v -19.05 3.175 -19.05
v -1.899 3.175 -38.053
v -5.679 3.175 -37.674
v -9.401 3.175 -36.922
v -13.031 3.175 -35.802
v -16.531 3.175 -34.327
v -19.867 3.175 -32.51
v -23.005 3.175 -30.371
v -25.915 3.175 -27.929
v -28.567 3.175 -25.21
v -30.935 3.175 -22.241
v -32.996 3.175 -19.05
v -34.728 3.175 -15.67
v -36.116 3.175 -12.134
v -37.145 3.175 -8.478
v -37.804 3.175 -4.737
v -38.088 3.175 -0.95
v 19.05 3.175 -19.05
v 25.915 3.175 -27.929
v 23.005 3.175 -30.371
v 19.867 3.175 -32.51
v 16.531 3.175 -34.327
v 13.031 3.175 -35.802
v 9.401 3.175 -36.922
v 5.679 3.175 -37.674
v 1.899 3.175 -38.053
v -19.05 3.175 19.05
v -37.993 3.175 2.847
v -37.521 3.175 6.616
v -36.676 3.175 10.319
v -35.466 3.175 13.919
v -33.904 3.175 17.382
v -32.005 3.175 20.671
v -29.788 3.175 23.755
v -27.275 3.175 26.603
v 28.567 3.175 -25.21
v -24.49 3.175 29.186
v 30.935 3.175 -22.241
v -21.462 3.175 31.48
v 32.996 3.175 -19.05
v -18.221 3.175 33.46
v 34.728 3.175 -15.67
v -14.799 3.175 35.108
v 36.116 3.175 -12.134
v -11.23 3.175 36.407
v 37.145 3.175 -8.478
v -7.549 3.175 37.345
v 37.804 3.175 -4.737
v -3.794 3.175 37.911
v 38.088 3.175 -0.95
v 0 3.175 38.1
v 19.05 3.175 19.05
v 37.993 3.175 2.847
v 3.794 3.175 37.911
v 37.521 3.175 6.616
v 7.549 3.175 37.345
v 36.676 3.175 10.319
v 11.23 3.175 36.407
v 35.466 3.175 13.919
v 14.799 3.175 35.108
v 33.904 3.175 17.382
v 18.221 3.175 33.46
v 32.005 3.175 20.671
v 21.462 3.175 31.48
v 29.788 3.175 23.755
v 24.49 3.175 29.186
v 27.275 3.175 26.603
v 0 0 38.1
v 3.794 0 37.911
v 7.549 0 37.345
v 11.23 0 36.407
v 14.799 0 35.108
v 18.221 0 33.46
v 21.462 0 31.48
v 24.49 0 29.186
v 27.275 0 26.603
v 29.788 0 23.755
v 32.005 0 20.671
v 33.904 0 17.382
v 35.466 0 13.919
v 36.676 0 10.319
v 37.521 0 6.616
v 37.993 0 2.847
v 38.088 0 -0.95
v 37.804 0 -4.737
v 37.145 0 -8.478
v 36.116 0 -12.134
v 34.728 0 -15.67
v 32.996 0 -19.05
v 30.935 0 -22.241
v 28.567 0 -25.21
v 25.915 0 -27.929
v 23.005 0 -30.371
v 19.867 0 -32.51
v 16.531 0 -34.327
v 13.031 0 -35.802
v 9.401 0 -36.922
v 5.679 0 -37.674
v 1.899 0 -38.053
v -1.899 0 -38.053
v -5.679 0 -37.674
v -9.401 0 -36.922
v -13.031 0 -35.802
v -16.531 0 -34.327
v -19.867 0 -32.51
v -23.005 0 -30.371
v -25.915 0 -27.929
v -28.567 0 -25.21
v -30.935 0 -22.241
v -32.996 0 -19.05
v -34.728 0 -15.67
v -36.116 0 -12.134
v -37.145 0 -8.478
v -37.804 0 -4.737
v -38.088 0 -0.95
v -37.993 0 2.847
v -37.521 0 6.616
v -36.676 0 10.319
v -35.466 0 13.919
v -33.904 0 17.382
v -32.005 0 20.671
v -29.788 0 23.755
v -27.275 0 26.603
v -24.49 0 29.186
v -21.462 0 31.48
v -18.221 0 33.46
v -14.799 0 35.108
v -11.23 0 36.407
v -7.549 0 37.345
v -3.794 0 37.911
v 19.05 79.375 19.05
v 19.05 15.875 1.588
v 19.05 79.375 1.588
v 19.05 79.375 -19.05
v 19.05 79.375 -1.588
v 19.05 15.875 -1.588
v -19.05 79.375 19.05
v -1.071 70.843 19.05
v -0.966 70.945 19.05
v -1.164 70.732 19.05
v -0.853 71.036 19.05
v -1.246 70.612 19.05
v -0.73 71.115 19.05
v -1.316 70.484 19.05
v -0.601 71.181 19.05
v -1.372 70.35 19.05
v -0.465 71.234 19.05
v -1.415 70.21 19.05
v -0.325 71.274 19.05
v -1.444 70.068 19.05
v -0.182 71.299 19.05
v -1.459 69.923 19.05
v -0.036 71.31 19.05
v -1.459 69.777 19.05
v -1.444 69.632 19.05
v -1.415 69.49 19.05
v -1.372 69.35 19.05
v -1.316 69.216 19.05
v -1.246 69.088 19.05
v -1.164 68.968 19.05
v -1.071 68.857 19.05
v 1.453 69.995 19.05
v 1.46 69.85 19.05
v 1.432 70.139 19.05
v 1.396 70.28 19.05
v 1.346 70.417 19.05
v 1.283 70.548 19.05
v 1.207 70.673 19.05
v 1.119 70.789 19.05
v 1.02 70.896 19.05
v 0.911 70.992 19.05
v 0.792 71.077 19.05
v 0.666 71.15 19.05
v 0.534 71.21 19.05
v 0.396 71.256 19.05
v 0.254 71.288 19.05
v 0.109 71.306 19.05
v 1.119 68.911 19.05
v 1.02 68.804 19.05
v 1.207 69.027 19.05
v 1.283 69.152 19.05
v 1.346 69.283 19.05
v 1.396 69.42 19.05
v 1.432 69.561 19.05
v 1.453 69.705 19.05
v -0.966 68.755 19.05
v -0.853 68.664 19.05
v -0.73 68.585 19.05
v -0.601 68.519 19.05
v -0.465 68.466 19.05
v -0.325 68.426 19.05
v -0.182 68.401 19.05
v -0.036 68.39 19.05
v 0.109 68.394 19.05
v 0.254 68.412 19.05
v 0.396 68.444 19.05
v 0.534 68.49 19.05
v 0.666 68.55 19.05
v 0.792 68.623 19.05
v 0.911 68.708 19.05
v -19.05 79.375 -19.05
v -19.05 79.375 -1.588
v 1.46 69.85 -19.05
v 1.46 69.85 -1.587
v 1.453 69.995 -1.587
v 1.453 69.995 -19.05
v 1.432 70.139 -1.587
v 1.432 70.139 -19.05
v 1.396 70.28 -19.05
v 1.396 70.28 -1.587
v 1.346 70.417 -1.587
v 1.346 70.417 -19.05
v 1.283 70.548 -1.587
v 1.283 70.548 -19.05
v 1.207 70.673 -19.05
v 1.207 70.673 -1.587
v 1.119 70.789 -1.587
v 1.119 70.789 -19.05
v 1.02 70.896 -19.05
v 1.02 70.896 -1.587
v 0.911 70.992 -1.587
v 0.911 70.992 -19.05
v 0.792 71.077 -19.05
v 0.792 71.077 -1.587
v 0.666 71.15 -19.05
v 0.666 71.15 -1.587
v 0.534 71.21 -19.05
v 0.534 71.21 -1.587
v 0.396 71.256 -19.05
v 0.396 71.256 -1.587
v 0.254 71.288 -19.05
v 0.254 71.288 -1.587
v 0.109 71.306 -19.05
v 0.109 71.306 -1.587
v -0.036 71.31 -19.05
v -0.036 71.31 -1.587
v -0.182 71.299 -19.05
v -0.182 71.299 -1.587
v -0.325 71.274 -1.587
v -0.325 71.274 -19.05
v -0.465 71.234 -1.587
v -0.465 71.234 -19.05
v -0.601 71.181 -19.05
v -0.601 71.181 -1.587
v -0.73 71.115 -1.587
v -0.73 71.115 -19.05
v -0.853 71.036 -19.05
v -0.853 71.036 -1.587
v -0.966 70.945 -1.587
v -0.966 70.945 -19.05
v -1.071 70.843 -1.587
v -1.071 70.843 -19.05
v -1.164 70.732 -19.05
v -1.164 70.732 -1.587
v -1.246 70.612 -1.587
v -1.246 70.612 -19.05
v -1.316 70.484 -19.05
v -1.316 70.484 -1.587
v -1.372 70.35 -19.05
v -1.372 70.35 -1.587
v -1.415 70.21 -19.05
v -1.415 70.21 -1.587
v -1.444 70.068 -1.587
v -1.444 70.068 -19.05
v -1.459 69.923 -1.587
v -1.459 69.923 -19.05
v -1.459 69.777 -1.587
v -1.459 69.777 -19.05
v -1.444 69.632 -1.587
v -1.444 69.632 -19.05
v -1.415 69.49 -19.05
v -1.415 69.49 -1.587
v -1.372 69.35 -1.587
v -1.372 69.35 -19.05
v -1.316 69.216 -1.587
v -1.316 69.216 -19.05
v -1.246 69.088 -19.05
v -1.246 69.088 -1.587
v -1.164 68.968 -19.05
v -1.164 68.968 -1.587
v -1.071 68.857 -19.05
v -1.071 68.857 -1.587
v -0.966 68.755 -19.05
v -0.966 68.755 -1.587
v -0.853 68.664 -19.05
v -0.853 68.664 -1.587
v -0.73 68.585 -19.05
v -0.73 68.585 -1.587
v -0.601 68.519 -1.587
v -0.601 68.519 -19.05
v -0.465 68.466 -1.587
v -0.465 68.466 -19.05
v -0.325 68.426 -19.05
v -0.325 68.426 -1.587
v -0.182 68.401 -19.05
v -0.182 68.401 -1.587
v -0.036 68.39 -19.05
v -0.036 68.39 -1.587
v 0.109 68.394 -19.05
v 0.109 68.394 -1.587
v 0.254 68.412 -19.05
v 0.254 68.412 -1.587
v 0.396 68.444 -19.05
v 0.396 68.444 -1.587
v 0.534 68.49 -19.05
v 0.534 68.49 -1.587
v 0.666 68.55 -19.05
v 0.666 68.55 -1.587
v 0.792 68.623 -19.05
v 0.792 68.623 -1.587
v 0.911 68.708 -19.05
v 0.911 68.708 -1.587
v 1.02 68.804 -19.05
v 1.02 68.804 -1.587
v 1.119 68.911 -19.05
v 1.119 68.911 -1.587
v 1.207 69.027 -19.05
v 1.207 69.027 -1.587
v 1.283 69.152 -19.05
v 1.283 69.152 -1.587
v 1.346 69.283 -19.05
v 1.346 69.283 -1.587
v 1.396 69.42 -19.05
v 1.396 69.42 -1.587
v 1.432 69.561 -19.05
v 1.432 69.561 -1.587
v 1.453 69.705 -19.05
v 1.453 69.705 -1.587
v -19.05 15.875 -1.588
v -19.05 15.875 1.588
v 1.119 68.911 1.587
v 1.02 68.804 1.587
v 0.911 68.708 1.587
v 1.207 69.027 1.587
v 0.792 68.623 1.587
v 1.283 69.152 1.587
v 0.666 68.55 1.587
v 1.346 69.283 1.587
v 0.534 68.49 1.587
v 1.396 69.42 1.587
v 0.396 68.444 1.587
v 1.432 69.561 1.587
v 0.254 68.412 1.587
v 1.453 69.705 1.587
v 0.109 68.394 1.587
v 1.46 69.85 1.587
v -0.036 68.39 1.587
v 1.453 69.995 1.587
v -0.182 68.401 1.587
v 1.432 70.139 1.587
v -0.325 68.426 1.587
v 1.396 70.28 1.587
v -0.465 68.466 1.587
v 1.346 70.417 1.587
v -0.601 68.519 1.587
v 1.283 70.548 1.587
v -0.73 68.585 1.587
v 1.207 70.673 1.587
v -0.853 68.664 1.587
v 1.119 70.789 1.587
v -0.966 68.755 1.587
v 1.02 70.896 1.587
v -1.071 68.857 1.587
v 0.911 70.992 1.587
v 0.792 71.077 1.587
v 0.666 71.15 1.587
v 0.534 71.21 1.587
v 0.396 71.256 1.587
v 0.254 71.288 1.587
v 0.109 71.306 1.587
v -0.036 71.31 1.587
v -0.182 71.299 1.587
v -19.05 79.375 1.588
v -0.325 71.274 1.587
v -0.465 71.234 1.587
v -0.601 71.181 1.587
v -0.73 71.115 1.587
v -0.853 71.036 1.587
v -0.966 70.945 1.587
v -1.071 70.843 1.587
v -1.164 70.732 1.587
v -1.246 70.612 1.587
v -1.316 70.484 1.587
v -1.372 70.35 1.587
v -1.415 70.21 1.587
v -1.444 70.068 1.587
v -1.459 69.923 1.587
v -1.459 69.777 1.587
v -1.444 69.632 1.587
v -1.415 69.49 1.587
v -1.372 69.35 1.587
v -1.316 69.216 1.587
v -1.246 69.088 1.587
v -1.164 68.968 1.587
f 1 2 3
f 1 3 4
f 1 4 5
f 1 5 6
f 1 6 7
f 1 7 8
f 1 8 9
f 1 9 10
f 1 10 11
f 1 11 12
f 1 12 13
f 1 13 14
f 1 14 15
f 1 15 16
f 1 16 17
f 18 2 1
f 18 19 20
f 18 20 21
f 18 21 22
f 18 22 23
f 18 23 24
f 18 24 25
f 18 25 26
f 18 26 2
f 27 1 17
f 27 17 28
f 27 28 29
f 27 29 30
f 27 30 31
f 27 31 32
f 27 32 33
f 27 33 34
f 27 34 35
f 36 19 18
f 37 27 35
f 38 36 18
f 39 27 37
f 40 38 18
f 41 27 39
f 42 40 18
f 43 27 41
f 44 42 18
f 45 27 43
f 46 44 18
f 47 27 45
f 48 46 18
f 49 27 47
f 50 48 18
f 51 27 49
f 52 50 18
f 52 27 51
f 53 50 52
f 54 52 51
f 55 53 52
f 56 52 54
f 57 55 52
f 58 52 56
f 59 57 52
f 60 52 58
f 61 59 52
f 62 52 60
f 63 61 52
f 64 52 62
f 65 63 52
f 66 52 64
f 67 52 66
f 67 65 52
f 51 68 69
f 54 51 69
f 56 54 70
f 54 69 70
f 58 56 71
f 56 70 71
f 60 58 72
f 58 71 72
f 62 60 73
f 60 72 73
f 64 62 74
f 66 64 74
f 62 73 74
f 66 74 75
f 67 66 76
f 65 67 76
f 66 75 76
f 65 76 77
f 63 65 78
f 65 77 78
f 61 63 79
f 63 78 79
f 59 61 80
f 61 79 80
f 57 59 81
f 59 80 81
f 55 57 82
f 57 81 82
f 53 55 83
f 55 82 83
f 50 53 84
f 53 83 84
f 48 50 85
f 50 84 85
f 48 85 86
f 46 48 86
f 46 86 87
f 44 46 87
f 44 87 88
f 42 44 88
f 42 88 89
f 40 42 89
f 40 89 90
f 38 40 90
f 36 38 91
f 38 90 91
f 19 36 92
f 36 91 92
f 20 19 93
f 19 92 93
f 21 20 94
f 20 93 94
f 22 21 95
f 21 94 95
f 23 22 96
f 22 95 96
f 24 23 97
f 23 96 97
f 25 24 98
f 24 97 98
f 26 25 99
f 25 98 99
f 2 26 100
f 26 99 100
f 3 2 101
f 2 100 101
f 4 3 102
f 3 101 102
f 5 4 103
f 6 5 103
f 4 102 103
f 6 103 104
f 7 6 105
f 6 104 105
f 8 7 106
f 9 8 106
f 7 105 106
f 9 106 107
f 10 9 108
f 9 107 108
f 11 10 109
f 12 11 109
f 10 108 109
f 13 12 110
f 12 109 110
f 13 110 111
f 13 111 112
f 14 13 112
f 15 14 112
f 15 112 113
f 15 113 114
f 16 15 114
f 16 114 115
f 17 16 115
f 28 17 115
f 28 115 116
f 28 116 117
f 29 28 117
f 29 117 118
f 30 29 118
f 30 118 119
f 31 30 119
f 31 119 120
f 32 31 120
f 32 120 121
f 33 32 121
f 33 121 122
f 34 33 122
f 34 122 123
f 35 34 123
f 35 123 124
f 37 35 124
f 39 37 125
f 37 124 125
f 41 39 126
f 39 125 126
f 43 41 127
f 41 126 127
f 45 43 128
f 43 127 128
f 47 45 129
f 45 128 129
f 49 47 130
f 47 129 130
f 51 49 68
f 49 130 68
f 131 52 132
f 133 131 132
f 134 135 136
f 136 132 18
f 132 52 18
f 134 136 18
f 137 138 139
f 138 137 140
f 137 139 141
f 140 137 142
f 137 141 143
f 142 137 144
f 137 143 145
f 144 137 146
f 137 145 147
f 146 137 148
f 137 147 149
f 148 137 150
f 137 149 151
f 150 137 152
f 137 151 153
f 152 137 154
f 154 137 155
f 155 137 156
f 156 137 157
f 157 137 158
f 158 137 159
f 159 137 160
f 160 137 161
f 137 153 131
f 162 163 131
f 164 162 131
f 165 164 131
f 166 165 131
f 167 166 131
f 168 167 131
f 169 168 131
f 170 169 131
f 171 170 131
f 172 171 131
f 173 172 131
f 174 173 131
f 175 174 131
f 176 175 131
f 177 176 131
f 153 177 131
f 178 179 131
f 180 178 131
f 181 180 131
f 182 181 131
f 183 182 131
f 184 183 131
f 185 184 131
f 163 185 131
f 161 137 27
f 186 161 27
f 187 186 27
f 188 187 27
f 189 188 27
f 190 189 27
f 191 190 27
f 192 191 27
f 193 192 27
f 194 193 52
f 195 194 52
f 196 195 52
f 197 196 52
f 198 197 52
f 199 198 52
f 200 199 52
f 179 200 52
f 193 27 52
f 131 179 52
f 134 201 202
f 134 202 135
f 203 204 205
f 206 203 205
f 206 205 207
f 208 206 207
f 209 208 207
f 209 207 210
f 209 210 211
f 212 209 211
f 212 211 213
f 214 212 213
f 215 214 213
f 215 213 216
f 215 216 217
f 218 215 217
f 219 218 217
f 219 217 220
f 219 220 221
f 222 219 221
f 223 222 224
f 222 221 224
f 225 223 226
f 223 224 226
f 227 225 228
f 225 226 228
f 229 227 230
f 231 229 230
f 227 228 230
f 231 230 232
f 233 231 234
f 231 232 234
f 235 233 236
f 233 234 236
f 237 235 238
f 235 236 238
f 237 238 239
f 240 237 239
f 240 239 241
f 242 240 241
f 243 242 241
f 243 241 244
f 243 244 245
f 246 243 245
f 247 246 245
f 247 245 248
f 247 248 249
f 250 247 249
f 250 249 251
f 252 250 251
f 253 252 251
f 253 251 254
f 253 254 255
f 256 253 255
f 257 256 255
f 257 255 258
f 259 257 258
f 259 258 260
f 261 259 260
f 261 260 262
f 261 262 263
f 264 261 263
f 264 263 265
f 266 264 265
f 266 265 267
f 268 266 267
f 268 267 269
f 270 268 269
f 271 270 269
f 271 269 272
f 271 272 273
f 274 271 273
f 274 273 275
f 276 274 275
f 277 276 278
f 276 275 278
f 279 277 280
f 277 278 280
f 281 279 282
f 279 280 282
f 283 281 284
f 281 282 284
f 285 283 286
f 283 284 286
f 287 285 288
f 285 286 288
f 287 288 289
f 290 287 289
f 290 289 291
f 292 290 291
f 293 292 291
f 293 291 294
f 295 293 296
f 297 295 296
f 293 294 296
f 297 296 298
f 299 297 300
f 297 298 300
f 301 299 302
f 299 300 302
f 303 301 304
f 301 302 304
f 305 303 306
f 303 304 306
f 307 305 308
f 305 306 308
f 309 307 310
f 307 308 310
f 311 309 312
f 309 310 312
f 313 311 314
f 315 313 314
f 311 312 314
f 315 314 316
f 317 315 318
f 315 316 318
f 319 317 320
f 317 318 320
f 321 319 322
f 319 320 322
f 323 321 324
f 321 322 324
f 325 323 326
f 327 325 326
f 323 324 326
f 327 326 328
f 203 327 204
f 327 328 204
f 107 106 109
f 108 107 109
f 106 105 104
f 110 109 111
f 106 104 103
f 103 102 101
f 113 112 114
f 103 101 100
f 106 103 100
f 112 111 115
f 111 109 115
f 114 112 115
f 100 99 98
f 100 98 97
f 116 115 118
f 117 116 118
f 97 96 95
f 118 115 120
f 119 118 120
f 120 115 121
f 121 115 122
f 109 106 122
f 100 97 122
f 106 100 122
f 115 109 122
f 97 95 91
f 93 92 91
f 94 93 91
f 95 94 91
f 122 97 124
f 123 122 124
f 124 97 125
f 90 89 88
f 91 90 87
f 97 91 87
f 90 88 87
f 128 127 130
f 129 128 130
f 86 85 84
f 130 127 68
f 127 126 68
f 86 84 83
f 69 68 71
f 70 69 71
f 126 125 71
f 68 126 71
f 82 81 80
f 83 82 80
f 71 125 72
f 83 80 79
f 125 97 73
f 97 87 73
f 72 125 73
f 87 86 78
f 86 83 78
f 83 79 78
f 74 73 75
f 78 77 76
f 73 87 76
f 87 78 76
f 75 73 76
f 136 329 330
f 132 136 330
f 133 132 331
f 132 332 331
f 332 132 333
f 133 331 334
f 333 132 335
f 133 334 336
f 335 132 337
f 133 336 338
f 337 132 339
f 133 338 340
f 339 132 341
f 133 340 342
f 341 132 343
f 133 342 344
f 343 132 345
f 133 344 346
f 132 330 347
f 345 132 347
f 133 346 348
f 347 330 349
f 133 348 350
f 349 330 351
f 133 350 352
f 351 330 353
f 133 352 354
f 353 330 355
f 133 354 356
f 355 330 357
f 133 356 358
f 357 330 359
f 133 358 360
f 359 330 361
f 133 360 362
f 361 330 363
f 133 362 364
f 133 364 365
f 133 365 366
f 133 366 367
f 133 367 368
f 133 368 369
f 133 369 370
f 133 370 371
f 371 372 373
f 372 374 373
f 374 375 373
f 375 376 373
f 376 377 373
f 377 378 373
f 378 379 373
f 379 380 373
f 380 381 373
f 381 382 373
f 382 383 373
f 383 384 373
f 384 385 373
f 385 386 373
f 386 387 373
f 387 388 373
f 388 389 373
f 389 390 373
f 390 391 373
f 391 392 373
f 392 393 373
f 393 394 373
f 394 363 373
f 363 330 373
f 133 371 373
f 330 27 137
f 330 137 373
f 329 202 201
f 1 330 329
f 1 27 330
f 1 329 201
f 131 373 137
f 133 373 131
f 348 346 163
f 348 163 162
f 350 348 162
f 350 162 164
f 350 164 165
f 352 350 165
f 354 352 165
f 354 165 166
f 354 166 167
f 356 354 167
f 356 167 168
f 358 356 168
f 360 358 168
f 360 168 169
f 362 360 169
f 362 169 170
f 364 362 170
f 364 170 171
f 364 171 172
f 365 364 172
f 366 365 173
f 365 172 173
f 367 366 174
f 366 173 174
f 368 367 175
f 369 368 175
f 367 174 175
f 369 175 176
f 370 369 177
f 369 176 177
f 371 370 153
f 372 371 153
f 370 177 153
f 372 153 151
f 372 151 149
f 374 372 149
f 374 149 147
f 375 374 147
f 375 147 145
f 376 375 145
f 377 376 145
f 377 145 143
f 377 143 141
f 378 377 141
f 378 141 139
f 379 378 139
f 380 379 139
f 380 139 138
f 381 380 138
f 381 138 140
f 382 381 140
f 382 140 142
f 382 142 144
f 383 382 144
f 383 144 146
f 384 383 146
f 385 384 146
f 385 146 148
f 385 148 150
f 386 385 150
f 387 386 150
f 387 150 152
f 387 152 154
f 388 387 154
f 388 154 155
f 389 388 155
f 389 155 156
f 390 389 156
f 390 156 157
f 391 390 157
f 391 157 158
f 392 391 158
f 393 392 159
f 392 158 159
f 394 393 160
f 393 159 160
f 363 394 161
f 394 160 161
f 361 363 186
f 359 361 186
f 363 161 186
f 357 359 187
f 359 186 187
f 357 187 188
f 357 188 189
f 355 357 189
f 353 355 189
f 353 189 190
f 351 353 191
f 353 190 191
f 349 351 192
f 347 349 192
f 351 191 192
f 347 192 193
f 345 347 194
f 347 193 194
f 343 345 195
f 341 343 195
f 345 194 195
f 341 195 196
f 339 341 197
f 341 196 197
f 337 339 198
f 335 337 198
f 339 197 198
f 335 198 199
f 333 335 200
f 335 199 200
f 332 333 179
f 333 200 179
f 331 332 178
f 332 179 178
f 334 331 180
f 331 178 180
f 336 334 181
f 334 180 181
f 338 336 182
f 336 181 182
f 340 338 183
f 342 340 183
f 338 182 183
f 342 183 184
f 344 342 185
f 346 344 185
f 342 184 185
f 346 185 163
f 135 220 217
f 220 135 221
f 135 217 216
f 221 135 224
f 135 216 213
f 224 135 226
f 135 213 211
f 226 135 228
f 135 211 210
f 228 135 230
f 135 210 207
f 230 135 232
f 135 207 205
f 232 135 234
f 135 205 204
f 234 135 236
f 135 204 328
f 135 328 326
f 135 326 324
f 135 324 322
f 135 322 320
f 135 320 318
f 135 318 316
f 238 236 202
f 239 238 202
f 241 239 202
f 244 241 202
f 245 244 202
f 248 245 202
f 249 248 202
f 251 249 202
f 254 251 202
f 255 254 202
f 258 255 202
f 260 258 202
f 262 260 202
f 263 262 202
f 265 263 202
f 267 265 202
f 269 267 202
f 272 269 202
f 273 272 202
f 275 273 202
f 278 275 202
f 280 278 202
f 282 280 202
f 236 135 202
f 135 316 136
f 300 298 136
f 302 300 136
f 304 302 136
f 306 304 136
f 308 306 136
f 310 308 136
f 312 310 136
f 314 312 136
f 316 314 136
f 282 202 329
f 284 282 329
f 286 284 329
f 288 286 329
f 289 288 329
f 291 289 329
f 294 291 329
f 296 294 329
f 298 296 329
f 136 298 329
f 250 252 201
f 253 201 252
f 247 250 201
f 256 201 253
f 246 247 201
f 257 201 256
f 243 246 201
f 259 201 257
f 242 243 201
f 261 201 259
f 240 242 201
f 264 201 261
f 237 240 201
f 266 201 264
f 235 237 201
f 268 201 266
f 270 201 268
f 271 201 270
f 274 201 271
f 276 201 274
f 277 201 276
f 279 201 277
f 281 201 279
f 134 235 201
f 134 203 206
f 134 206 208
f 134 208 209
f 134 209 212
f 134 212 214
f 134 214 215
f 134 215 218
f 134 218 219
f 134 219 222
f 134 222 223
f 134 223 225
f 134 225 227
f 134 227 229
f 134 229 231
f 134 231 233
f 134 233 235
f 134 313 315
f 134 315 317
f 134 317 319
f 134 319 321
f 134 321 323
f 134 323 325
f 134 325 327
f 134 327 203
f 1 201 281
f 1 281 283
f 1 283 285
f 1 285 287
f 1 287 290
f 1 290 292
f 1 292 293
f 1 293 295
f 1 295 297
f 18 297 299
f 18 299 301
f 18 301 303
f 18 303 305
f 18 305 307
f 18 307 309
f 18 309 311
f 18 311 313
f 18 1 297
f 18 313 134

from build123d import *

# Parameters (mm, degrees)
SKETCH1_R           = 38.1
BOSS_EXTRUDE1_DEPTH = 3.175
SKETCH2_W           = 38.1
SKETCH2_H           = 38.1
BOSS_EXTRUDE3_DEPTH = 76.2
CUT_EXTRUDE1_DEPTH  = 105.967247868
SKETCH6_R           = 1.4605
CUT_EXTRUDE2_DEPTH  = 105.967247868


with BuildPart() as part:
    # Sketch1 → Boss-Extrude1 (new body)
    with BuildSketch(Plane(origin=(0, 0, 0), x_dir=(1, 0, 0), z_dir=(0, 1, 0))):
        with Locations(Location((0, 0, 0), (0, 0, 270))):
            Circle(SKETCH1_R)
    extrude(amount=BOSS_EXTRUDE1_DEPTH)

    # Sketch2 → Boss-Extrude3 (add)
    with BuildSketch(Plane(origin=(0, 3.175, 0), x_dir=(1, 0, 0), z_dir=(0, 1, 0))):
        Rectangle(SKETCH2_W, SKETCH2_H)
    extrude(amount=BOSS_EXTRUDE3_DEPTH)

    # Sketch5 → Cut-Extrude1 (cut, through all)
    with BuildSketch(Plane.ZY.offset(19.05)):
        Polygon((0, 79.375), (-1.5875, 79.375), (-1.5875, 15.875), (1.5875, 15.875), (1.5875, 79.375), align=None)
    extrude(amount=-CUT_EXTRUDE1_DEPTH, mode=Mode.SUBTRACT)

    # Sketch6 → Cut-Extrude2 (cut, through all)
    with BuildSketch(Plane.XY.offset(19.05)):
        with Locations((0, 69.85)):
            Circle(SKETCH6_R)
    extrude(amount=-CUT_EXTRUDE2_DEPTH, mode=Mode.SUBTRACT)


solid = part.part
